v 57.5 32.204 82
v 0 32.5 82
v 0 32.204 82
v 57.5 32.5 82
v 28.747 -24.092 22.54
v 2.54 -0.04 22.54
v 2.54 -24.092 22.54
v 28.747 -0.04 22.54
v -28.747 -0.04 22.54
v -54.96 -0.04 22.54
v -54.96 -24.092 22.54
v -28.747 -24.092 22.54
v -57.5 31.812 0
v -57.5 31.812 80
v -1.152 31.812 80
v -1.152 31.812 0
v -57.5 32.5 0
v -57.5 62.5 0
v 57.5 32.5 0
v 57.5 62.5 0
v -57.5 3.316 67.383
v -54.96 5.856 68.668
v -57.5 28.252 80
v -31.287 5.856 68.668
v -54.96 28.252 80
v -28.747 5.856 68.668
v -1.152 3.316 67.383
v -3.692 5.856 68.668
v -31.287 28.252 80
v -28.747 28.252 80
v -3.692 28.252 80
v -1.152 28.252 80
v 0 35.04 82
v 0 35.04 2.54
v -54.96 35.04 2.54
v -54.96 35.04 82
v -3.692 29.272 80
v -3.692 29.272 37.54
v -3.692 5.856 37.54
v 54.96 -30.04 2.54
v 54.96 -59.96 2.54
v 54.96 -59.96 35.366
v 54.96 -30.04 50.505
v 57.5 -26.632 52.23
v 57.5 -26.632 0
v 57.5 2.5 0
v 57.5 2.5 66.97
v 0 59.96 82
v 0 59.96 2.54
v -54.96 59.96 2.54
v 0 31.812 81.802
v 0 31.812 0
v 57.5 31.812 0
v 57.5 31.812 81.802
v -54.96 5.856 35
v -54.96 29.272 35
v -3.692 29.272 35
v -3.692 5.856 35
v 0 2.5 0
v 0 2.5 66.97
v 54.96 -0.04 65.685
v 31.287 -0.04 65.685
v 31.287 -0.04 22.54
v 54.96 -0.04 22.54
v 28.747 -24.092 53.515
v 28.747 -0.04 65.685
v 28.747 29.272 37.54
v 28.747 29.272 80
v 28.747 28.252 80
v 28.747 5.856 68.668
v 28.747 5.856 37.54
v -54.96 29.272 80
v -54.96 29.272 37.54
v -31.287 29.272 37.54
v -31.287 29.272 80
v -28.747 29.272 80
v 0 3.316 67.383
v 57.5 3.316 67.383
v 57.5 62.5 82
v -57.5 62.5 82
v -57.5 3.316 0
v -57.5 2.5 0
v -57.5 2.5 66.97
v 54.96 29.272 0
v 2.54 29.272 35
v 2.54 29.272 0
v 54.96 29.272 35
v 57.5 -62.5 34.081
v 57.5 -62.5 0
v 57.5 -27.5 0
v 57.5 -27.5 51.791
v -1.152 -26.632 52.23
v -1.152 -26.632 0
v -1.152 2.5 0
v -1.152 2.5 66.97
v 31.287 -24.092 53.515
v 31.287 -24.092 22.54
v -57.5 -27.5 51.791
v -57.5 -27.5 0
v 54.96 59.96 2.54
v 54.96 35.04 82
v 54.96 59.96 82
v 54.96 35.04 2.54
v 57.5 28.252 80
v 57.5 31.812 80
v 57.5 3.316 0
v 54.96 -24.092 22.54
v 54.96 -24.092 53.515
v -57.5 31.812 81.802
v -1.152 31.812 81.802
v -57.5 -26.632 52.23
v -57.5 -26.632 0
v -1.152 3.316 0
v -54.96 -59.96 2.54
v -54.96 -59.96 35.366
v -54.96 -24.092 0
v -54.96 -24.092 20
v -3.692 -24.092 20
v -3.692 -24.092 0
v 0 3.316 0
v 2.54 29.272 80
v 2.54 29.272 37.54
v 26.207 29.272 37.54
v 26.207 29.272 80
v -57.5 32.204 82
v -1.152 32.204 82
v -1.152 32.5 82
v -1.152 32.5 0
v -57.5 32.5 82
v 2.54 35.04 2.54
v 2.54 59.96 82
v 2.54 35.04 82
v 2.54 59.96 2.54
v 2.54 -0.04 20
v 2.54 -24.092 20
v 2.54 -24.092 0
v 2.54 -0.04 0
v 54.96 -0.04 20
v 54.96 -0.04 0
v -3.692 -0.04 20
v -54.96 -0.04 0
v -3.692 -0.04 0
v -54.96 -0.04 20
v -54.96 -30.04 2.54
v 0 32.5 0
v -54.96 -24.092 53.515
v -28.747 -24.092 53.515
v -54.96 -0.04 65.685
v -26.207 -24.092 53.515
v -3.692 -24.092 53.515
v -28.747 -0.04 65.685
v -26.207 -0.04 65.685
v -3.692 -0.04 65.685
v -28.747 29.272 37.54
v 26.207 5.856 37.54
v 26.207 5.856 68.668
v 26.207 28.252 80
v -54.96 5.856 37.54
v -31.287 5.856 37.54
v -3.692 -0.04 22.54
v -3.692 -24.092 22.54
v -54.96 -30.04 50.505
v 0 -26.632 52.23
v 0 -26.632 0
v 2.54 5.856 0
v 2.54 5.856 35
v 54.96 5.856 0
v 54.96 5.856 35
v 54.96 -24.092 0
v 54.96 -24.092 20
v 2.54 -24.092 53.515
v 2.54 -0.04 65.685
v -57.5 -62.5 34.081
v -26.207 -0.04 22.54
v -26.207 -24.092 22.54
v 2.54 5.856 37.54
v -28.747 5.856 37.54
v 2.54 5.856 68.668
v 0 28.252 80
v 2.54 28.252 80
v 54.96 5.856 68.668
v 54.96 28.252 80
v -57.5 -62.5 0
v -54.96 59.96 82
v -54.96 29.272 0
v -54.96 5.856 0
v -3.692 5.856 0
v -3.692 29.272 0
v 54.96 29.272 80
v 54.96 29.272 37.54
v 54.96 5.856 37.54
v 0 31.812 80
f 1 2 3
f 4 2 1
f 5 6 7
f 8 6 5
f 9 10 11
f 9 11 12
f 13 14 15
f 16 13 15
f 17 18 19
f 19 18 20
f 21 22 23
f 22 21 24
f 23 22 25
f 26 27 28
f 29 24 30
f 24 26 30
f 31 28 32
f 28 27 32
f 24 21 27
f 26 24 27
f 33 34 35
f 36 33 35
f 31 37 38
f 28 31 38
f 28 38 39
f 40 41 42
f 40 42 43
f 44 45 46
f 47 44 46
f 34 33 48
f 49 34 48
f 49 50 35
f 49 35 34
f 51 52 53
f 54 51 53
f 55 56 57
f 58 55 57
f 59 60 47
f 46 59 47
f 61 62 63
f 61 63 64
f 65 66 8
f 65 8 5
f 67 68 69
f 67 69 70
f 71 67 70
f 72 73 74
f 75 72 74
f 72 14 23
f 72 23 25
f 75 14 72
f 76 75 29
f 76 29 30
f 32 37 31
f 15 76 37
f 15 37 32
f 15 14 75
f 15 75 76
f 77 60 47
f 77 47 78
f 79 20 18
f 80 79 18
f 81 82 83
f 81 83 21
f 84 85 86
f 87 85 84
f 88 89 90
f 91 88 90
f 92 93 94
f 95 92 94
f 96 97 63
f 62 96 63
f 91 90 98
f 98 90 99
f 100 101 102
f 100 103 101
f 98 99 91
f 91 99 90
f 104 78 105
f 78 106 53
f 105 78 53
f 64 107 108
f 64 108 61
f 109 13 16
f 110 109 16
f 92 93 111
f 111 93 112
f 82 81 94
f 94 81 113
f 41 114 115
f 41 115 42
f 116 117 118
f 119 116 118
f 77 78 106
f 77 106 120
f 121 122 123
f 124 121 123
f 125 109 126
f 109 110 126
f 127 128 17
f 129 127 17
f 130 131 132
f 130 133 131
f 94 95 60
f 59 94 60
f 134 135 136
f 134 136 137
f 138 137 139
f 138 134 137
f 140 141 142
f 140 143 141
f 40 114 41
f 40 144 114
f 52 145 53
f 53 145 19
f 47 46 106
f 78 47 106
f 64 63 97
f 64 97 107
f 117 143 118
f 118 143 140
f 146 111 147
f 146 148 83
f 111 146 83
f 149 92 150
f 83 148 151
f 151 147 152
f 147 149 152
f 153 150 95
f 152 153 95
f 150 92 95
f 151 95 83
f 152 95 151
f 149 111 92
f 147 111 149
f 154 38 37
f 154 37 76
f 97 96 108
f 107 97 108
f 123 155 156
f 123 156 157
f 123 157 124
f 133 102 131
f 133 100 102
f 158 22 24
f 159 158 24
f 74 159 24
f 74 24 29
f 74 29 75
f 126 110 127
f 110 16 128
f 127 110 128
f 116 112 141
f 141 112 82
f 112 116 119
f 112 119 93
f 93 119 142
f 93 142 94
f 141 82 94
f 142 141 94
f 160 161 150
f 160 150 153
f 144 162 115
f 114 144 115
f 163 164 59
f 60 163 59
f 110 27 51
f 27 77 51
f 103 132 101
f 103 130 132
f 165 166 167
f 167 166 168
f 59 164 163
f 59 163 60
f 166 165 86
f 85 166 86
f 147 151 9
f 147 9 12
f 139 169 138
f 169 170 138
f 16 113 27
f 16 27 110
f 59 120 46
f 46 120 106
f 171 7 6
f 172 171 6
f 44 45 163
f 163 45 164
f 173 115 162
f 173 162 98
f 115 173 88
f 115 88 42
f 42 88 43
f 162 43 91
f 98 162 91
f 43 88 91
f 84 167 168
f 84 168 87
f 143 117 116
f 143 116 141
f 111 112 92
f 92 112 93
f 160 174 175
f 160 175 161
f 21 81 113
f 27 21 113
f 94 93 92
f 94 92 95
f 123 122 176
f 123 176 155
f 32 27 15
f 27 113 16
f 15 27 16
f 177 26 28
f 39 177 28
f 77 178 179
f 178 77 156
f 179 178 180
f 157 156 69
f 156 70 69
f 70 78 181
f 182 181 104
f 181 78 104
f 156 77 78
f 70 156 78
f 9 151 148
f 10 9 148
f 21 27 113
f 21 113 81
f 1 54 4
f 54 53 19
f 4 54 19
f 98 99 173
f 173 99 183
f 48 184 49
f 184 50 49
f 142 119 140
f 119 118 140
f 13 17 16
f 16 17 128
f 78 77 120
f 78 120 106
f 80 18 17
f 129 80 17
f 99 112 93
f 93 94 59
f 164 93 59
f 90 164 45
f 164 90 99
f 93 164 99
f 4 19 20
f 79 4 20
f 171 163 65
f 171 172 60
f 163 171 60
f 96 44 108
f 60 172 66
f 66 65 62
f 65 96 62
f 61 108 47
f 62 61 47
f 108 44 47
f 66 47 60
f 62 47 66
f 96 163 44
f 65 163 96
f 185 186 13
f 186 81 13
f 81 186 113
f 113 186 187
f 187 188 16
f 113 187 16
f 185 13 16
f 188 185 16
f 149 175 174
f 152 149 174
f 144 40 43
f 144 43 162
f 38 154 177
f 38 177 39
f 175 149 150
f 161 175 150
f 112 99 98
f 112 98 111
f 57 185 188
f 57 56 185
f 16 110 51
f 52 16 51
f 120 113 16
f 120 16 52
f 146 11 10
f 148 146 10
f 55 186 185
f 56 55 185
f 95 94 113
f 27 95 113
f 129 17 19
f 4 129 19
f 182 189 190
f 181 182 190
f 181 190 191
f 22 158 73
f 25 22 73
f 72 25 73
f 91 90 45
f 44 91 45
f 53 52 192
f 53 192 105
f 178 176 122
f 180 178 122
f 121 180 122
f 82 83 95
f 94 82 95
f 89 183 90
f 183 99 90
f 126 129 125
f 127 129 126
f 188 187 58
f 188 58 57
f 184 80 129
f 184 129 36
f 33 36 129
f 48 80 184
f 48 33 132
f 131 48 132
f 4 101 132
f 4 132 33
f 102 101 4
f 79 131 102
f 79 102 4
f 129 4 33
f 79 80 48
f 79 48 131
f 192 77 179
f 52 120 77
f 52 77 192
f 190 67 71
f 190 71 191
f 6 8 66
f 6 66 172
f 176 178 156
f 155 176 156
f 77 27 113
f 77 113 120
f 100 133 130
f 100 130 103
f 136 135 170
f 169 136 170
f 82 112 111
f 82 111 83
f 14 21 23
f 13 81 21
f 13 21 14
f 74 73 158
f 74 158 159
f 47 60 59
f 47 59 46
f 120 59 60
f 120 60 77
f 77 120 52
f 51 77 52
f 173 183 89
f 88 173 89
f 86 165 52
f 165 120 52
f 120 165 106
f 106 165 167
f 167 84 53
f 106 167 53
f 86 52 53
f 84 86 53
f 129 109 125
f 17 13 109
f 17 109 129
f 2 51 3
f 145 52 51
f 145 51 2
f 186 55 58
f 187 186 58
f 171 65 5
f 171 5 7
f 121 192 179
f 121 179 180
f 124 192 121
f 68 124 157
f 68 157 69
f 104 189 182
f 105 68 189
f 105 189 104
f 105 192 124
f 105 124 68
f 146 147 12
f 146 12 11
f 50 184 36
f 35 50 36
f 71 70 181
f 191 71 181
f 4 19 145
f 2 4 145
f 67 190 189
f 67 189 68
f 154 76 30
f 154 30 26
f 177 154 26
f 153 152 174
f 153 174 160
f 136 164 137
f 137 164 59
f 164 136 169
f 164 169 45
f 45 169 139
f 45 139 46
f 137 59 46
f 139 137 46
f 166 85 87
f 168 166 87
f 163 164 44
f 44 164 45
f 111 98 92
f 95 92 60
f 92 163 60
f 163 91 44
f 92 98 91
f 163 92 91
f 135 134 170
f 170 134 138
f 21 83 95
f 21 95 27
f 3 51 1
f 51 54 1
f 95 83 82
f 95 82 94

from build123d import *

# Parameters (mm, degrees)
F1_DEPTH  = 82
F2_T      = -2.54
F3_DEPTH  = 82
F4_T      = -2.54
F5_DEPTH  = 52
F6_T      = -2.54
F0_W      = 28.7528
F0_H      = 29.1317389905
F7_DEPTH  = 70
F8_T      = -2.54
F9_DEPTH  = 20
F0_W_2    = 28.7472
F10_DEPTH = 70
F11_T     = -2.54
F12_DEPTH = 20
F13_T     = -2.54
F0_W_3    = 27.5952454776
F14_DEPTH = 70
F15_T     = -2.54
F16_DEPTH = 20
F17_DEPTH = 70
F18_T     = -2.54
F19_DEPTH = 20
F20_T     = -2.54
F0_H_2    = 28.496308485
F21_DEPTH = 80
F22_T     = -2.54
F23_DEPTH = 35
F24_DEPTH = 80
F25_T     = -2.54
F26_DEPTH = 35
F27_DEPTH = 80
F28_T     = -2.54
F29_DEPTH = 35
F30_DEPTH = 80
F31_T     = -2.54
F32_DEPTH = 35
F33_T     = -2.54
F33_2_T   = -2.54
F0_H_3    = 0.8682610095
F0_W_4    = 1.1519545224
F34_DEPTH = 82
F0_H_4    = 0.816094866
F0_H_5    = 0.6875966489
F36_DEPTH = 112.776


# Not quite as in the source:
# - a shell that OpenCascade refuses in one call is made with other operations: the cavity is built on its own and cut out


with BuildPart() as f1:
    # F0 (on Top) → F1 (new body)
    with BuildSketch(Plane.XY):
        Polygon((28.7472, 32.5), (57.5, 32.5), (57.5, 62.5), (0, 62.5), (0, 32.5), align=None)
    extrude(amount=F1_DEPTH)

    # F2
    f2_openings = [f1.faces().sort_by_distance(p)[0] for p in [
        (28.75, 47.5, 82),
    ]]
    offset(amount=F2_T, openings=f2_openings)

    # F0 (on Top) → F3 (join)
    with BuildSketch(Plane.XY):
        Polygon((-57.5, 62.5), (-57.5, 32.5), (-28.7472, 32.5), (-1.1519545224, 32.5), (0, 32.5), (0, 62.5), align=None)
    extrude(amount=F3_DEPTH)

    # F4: a shell. OpenCascade refuses it in one call, so the cavity is built on its own and cut out:
    # the body offset inwards by the wall thickness, plus a prism from it out through each open face.
    f4_core = offset(f1.part, amount=F4_T, kind=Kind.INTERSECTION, mode=Mode.PRIVATE)
    f4_exits = [f4_core.faces().sort_by_distance(p)[0] for p in [
        (-27.48, 47.5, 79.46),
    ]]
    add(f4_core, mode=Mode.SUBTRACT)
    extrude(f4_exits, amount=-F4_T, mode=Mode.SUBTRACT)


with BuildPart() as f5:
    # F0 (on Top) → F5 (new body)
    with BuildSketch(Plane.XY):
        Polygon((-57.5, -62.5), (57.5, -62.5), (57.5, -27.5), (28.7472, -27.5), (0, -27.5), (-28.7472, -27.5), (-57.5, -27.5), align=None)
    extrude(amount=F5_DEPTH)

    # F6
    f6_openings = [f5.faces().sort_by_distance(p)[0] for p in [
        (0, -45, 52),
    ]]
    offset(amount=F6_T, openings=f6_openings)


with BuildPart() as f7:
    # F0 (on Top) → F7 (new body)
    with BuildSketch(Plane.XY):
        with Locations((43.1236, -12.0658694953)):
            Rectangle(F0_W, F0_H)
    extrude(amount=F7_DEPTH)

    # F8
    f8_openings = [f7.faces().sort_by_distance(p)[0] for p in [
        (43.1236, -12.065869, 70),
    ]]
    offset(amount=F8_T, openings=f8_openings)

    # F9 (add): a face of the model
    f9_faces = [f7.faces().sort_by_distance(p)[0] for p in [
        (43.1236, -12.0658694953, 2.54),
    ]]
    extrude(f9_faces, amount=F9_DEPTH)

    # F0 (on Top) → F10 (join)
    with BuildSketch(Plane.XY):
        with Locations((14.3736, -12.0658694953)):
            Rectangle(F0_W_2, F0_H)
    extrude(amount=F10_DEPTH)

    # F11: a shell. OpenCascade refuses it in one call, so the cavity is built on its own and cut out:
    # the body offset inwards by the wall thickness, plus a prism from it out through each open face.
    f11_core = offset(f7.part, amount=F11_T, kind=Kind.INTERSECTION, mode=Mode.PRIVATE)
    f11_exits = [f11_core.faces().sort_by_distance(p)[0] for p in [
        (15.6436, -12.065869, 67.46),
    ]]
    add(f11_core, mode=Mode.SUBTRACT)
    extrude(f11_exits, amount=-F11_T, mode=Mode.SUBTRACT)

    # F12 (add): a face of the model
    f12_faces = [f7.faces().sort_by_distance(p)[0] for p in [
        (28.75, -12.0658694953, 2.54),
    ]]
    extrude(f12_faces, amount=F12_DEPTH)

    # F13: a shell. OpenCascade refuses it in one call, so the cavity is built on its own and cut out:
    # the body offset inwards by the wall thickness, plus a prism from it out through each open face.
    f13_core = offset(f7.part, amount=F13_T, kind=Kind.INTERSECTION, mode=Mode.PRIVATE)
    f13_exits = [f13_core.faces().sort_by_distance(p)[0] for p in [
        (28.75, -12.065869, 2.54),
    ]]
    add(f13_core, mode=Mode.SUBTRACT)
    extrude(f13_exits, amount=-F13_T, mode=Mode.SUBTRACT)


with BuildPart() as f14:
    # F0 (on Top) → F14 (new body)
    with BuildSketch(Plane.XY):
        with Locations((-14.9495772612, -12.0658694953)):
            Rectangle(F0_W_3, F0_H)
    extrude(amount=F14_DEPTH)

    # F15
    f15_openings = [f14.faces().sort_by_distance(p)[0] for p in [
        (-14.949577, -12.065869, 70),
    ]]
    offset(amount=F15_T, openings=f15_openings)

    # F16 (add): a face of the model
    f16_faces = [f14.faces().sort_by_distance(p)[0] for p in [
        (-14.9495772612, -12.0658694953, 2.54),
    ]]
    extrude(f16_faces, amount=F16_DEPTH)

    # F0 (on Top) → F17 (join)
    with BuildSketch(Plane.XY):
        with Locations((-43.1236, -12.0658694953)):
            Rectangle(F0_W, F0_H)
    extrude(amount=F17_DEPTH)

    # F18: a shell. OpenCascade refuses it in one call, so the cavity is built on its own and cut out:
    # the body offset inwards by the wall thickness, plus a prism from it out through each open face.
    f18_core = offset(f14.part, amount=F18_T, kind=Kind.INTERSECTION, mode=Mode.PRIVATE)
    f18_exits = [f18_core.faces().sort_by_distance(p)[0] for p in [
        (-41.8536, -12.065869, 67.46),
    ]]
    add(f18_core, mode=Mode.SUBTRACT)
    extrude(f18_exits, amount=-F18_T, mode=Mode.SUBTRACT)

    # F19 (add): a face of the model
    f19_faces = [f14.faces().sort_by_distance(p)[0] for p in [
        (-29.3259772612, -12.0658694953, 2.54),
    ]]
    extrude(f19_faces, amount=F19_DEPTH)

    # F20: a shell. OpenCascade refuses it in one call, so the cavity is built on its own and cut out:
    # the body offset inwards by the wall thickness, plus a prism from it out through each open face.
    f20_core = offset(f14.part, amount=F20_T, kind=Kind.INTERSECTION, mode=Mode.PRIVATE)
    f20_exits = [f20_core.faces().sort_by_distance(p)[0] for p in [
        (-29.325977, -12.065869, 2.54),
    ]]
    add(f20_core, mode=Mode.SUBTRACT)
    extrude(f20_exits, amount=-F20_T, mode=Mode.SUBTRACT)


with BuildPart() as f21:
    # F0 (on Top) → F21 (new body)
    with BuildSketch(Plane.XY):
        with Locations((-43.1236, 17.5642491085)):
            Rectangle(F0_W, F0_H_2)
    extrude(amount=F21_DEPTH)

    # F22
    f22_openings = [f21.faces().sort_by_distance(p)[0] for p in [
        (-43.1236, 17.564249, 80),
    ]]
    offset(amount=F22_T, openings=f22_openings)

    # F23 (add): a face of the model
    f23_faces = [f21.faces().sort_by_distance(p)[0] for p in [
        (-43.1236, 17.5642491085, 2.54),
    ]]
    extrude(f23_faces, amount=F23_DEPTH)

    # F0 (on Top) → F24 (join)
    with BuildSketch(Plane.XY):
        with Locations((-14.9495772612, 17.5642491085)):
            Rectangle(F0_W_3, F0_H_2)
    extrude(amount=F24_DEPTH)

    # F25: a shell. OpenCascade refuses it in one call, so the cavity is built on its own and cut out:
    # the body offset inwards by the wall thickness, plus a prism from it out through each open face.
    f25_core = offset(f21.part, amount=F25_T, kind=Kind.INTERSECTION, mode=Mode.PRIVATE)
    f25_exits = [f25_core.faces().sort_by_distance(p)[0] for p in [
        (-16.219577, 17.564249, 77.46),
    ]]
    add(f25_core, mode=Mode.SUBTRACT)
    extrude(f25_exits, amount=-F25_T, mode=Mode.SUBTRACT)

    # F26 (add): a face of the model
    f26_faces = [f21.faces().sort_by_distance(p)[0] for p in [
        (-29.3259772612, 17.5642491085, 2.54),
    ]]
    extrude(f26_faces, amount=F26_DEPTH)

    # F33#2: a shell. OpenCascade refuses it in one call, so the cavity is built on its own and cut out:
    # the body offset inwards by the wall thickness, plus a prism from it out through each open face.
    f33_2_core = offset(f21.part, amount=F33_2_T, kind=Kind.INTERSECTION, mode=Mode.PRIVATE)
    f33_2_exits = [f33_2_core.faces().sort_by_distance(p)[0] for p in [
        (-29.325977, 17.564249, 2.54),
    ]]
    add(f33_2_core, mode=Mode.SUBTRACT)
    extrude(f33_2_exits, amount=-F33_2_T, mode=Mode.SUBTRACT)


with BuildPart() as f27:
    # F0 (on Top) → F27 (new body)
    with BuildSketch(Plane.XY):
        with Locations((14.3736, 17.5642491085)):
            Rectangle(F0_W_2, F0_H_2)
    extrude(amount=F27_DEPTH)

    # F28
    f28_openings = [f27.faces().sort_by_distance(p)[0] for p in [
        (14.3736, 17.564249, 80),
    ]]
    offset(amount=F28_T, openings=f28_openings)

    # F29 (add): a face of the model
    f29_faces = [f27.faces().sort_by_distance(p)[0] for p in [
        (14.3736, 17.5642491085, 2.54),
    ]]
    extrude(f29_faces, amount=F29_DEPTH)

    # F0 (on Top) → F30 (join)
    with BuildSketch(Plane.XY):
        with Locations((43.1236, 17.5642491085)):
            Rectangle(F0_W, F0_H_2)
    extrude(amount=F30_DEPTH)

    # F31: a shell. OpenCascade refuses it in one call, so the cavity is built on its own and cut out:
    # the body offset inwards by the wall thickness, plus a prism from it out through each open face.
    f31_core = offset(f27.part, amount=F31_T, kind=Kind.INTERSECTION, mode=Mode.PRIVATE)
    f31_exits = [f31_core.faces().sort_by_distance(p)[0] for p in [
        (41.8536, 17.564249, 77.46),
    ]]
    add(f31_core, mode=Mode.SUBTRACT)
    extrude(f31_exits, amount=-F31_T, mode=Mode.SUBTRACT)

    # F32 (add): a face of the model
    f32_faces = [f27.faces().sort_by_distance(p)[0] for p in [
        (28.75, 17.5642491085, 2.54),
    ]]
    extrude(f32_faces, amount=F32_DEPTH)

    # F33: a shell. OpenCascade refuses it in one call, so the cavity is built on its own and cut out:
    # the body offset inwards by the wall thickness, plus a prism from it out through each open face.
    f33_core = offset(f27.part, amount=F33_T, kind=Kind.INTERSECTION, mode=Mode.PRIVATE)
    f33_exits = [f33_core.faces().sort_by_distance(p)[0] for p in [
        (28.75, 17.564249, 2.54),
    ]]
    add(f33_core, mode=Mode.SUBTRACT)
    extrude(f33_exits, amount=-F33_T, mode=Mode.SUBTRACT)


with BuildPart() as f34:
    # F0 (on Top) → F34 (new body)
    with BuildSketch(Plane.XY):
        Polygon((-28.7472, -26.6317389905), (-28.7472, -27.5), (0, -27.5), (0, -26.6317389905), (-1.1519545224, -26.6317389905), align=None)
        with Locations((-43.1236, -27.0658694953)):
            Rectangle(F0_W, F0_H_3)
        with Locations((43.1236, -27.0658694953)):
            Rectangle(F0_W, F0_H_3)
        with Locations((14.3736, -27.0658694953)):
            Rectangle(F0_W_2, F0_H_3)
        with Locations((-0.5759772612, -12.0658694953)):
            Rectangle(F0_W_4, F0_H)
    extrude(amount=F34_DEPTH)


with BuildPart() as f34b:
    # F0 (on Top) → F34, piece 2 (new body)
    with BuildSketch(Plane.XY):
        with Locations((14.3736, 2.908047433)):
            Rectangle(F0_W_2, F0_H_4)
        with Locations((43.1236, 2.908047433)):
            Rectangle(F0_W, F0_H_4)
    extrude(amount=F34_DEPTH)


with BuildPart() as f34c:
    # F0 (on Top) → F34, piece 3 (new body)
    with BuildSketch(Plane.XY):
        with Locations((-14.9495772612, 2.908047433)):
            Rectangle(F0_W_3, F0_H_4)
        with Locations((-43.1236, 2.908047433)):
            Rectangle(F0_W, F0_H_4)
    extrude(amount=F34_DEPTH)


with BuildPart() as f34d:
    # F0 (on Top) → F34, piece 4 (new body)
    with BuildSketch(Plane.XY):
        with Locations((-43.1236, 32.1562016755)):
            Rectangle(F0_W, F0_H_5)
        with Locations((-14.9495772612, 32.1562016755)):
            Rectangle(F0_W_3, F0_H_5)
    extrude(amount=F34_DEPTH)


with BuildPart() as f34e:
    # F0 (on Top) → F34, piece 5 (new body)
    with BuildSketch(Plane.XY):
        with Locations((-0.5759772612, 17.5642491085)):
            Rectangle(F0_W_4, F0_H_2)
    extrude(amount=F34_DEPTH)


with BuildPart() as f34f:
    # F0 (on Top) → F34, piece 6 (new body)
    with BuildSketch(Plane.XY):
        with Locations((14.3736, 32.1562016755)):
            Rectangle(F0_W_2, F0_H_5)
        with Locations((43.1236, 32.1562016755)):
            Rectangle(F0_W, F0_H_5)
    extrude(amount=F34_DEPTH)


with BuildPart() as f36_tool:
    # F35 (on Right) → F36 (new body, symmetric)
    with BuildSketch(Plane.YZ):
        Polygon((-62.7673566341, 33.945877105), (32.7664129436, 82.2843536735), (33.6038582027, 108.728043735), (-62.7673566341, 108.728043735), align=None)
    extrude(amount=F36_DEPTH, both=True)


with BuildPart() as f5_1:
    add(f5.part)

    # F36: cut by f36_tool
    add(f36_tool.part, mode=Mode.SUBTRACT)


with BuildPart() as f7_1:
    add(f7.part)

    # F36: cut by f36_tool
    add(f36_tool.part, mode=Mode.SUBTRACT)


with BuildPart() as f14_1:
    add(f14.part)

    # F36: cut by f36_tool
    add(f36_tool.part, mode=Mode.SUBTRACT)


with BuildPart() as f21_1:
    add(f21.part)

    # F36: cut by f36_tool
    add(f36_tool.part, mode=Mode.SUBTRACT)


with BuildPart() as f27_1:
    add(f27.part)

    # F36: cut by f36_tool
    add(f36_tool.part, mode=Mode.SUBTRACT)


with BuildPart() as f34_1:
    add(f34.part)

    # F36: cut by f36_tool
    add(f36_tool.part, mode=Mode.SUBTRACT)


with BuildPart() as f34b_1:
    add(f34b.part)

    # F36: cut by f36_tool
    add(f36_tool.part, mode=Mode.SUBTRACT)


with BuildPart() as f34c_1:
    add(f34c.part)

    # F36: cut by f36_tool
    add(f36_tool.part, mode=Mode.SUBTRACT)


with BuildPart() as f34d_1:
    add(f34d.part)

    # F36: cut by f36_tool
    add(f36_tool.part, mode=Mode.SUBTRACT)


with BuildPart() as f34e_1:
    add(f34e.part)

    # F36: cut by f36_tool
    add(f36_tool.part, mode=Mode.SUBTRACT)


with BuildPart() as f34f_1:
    add(f34f.part)

    # F36: cut by f36_tool
    add(f36_tool.part, mode=Mode.SUBTRACT)


solid = Compound([f1.part, f5_1.part, f7_1.part, f14_1.part, f21_1.part, f27_1.part, f34_1.part, f34b_1.part, f34c_1.part, f34d_1.part, f34e_1.part, f34f_1.part])
